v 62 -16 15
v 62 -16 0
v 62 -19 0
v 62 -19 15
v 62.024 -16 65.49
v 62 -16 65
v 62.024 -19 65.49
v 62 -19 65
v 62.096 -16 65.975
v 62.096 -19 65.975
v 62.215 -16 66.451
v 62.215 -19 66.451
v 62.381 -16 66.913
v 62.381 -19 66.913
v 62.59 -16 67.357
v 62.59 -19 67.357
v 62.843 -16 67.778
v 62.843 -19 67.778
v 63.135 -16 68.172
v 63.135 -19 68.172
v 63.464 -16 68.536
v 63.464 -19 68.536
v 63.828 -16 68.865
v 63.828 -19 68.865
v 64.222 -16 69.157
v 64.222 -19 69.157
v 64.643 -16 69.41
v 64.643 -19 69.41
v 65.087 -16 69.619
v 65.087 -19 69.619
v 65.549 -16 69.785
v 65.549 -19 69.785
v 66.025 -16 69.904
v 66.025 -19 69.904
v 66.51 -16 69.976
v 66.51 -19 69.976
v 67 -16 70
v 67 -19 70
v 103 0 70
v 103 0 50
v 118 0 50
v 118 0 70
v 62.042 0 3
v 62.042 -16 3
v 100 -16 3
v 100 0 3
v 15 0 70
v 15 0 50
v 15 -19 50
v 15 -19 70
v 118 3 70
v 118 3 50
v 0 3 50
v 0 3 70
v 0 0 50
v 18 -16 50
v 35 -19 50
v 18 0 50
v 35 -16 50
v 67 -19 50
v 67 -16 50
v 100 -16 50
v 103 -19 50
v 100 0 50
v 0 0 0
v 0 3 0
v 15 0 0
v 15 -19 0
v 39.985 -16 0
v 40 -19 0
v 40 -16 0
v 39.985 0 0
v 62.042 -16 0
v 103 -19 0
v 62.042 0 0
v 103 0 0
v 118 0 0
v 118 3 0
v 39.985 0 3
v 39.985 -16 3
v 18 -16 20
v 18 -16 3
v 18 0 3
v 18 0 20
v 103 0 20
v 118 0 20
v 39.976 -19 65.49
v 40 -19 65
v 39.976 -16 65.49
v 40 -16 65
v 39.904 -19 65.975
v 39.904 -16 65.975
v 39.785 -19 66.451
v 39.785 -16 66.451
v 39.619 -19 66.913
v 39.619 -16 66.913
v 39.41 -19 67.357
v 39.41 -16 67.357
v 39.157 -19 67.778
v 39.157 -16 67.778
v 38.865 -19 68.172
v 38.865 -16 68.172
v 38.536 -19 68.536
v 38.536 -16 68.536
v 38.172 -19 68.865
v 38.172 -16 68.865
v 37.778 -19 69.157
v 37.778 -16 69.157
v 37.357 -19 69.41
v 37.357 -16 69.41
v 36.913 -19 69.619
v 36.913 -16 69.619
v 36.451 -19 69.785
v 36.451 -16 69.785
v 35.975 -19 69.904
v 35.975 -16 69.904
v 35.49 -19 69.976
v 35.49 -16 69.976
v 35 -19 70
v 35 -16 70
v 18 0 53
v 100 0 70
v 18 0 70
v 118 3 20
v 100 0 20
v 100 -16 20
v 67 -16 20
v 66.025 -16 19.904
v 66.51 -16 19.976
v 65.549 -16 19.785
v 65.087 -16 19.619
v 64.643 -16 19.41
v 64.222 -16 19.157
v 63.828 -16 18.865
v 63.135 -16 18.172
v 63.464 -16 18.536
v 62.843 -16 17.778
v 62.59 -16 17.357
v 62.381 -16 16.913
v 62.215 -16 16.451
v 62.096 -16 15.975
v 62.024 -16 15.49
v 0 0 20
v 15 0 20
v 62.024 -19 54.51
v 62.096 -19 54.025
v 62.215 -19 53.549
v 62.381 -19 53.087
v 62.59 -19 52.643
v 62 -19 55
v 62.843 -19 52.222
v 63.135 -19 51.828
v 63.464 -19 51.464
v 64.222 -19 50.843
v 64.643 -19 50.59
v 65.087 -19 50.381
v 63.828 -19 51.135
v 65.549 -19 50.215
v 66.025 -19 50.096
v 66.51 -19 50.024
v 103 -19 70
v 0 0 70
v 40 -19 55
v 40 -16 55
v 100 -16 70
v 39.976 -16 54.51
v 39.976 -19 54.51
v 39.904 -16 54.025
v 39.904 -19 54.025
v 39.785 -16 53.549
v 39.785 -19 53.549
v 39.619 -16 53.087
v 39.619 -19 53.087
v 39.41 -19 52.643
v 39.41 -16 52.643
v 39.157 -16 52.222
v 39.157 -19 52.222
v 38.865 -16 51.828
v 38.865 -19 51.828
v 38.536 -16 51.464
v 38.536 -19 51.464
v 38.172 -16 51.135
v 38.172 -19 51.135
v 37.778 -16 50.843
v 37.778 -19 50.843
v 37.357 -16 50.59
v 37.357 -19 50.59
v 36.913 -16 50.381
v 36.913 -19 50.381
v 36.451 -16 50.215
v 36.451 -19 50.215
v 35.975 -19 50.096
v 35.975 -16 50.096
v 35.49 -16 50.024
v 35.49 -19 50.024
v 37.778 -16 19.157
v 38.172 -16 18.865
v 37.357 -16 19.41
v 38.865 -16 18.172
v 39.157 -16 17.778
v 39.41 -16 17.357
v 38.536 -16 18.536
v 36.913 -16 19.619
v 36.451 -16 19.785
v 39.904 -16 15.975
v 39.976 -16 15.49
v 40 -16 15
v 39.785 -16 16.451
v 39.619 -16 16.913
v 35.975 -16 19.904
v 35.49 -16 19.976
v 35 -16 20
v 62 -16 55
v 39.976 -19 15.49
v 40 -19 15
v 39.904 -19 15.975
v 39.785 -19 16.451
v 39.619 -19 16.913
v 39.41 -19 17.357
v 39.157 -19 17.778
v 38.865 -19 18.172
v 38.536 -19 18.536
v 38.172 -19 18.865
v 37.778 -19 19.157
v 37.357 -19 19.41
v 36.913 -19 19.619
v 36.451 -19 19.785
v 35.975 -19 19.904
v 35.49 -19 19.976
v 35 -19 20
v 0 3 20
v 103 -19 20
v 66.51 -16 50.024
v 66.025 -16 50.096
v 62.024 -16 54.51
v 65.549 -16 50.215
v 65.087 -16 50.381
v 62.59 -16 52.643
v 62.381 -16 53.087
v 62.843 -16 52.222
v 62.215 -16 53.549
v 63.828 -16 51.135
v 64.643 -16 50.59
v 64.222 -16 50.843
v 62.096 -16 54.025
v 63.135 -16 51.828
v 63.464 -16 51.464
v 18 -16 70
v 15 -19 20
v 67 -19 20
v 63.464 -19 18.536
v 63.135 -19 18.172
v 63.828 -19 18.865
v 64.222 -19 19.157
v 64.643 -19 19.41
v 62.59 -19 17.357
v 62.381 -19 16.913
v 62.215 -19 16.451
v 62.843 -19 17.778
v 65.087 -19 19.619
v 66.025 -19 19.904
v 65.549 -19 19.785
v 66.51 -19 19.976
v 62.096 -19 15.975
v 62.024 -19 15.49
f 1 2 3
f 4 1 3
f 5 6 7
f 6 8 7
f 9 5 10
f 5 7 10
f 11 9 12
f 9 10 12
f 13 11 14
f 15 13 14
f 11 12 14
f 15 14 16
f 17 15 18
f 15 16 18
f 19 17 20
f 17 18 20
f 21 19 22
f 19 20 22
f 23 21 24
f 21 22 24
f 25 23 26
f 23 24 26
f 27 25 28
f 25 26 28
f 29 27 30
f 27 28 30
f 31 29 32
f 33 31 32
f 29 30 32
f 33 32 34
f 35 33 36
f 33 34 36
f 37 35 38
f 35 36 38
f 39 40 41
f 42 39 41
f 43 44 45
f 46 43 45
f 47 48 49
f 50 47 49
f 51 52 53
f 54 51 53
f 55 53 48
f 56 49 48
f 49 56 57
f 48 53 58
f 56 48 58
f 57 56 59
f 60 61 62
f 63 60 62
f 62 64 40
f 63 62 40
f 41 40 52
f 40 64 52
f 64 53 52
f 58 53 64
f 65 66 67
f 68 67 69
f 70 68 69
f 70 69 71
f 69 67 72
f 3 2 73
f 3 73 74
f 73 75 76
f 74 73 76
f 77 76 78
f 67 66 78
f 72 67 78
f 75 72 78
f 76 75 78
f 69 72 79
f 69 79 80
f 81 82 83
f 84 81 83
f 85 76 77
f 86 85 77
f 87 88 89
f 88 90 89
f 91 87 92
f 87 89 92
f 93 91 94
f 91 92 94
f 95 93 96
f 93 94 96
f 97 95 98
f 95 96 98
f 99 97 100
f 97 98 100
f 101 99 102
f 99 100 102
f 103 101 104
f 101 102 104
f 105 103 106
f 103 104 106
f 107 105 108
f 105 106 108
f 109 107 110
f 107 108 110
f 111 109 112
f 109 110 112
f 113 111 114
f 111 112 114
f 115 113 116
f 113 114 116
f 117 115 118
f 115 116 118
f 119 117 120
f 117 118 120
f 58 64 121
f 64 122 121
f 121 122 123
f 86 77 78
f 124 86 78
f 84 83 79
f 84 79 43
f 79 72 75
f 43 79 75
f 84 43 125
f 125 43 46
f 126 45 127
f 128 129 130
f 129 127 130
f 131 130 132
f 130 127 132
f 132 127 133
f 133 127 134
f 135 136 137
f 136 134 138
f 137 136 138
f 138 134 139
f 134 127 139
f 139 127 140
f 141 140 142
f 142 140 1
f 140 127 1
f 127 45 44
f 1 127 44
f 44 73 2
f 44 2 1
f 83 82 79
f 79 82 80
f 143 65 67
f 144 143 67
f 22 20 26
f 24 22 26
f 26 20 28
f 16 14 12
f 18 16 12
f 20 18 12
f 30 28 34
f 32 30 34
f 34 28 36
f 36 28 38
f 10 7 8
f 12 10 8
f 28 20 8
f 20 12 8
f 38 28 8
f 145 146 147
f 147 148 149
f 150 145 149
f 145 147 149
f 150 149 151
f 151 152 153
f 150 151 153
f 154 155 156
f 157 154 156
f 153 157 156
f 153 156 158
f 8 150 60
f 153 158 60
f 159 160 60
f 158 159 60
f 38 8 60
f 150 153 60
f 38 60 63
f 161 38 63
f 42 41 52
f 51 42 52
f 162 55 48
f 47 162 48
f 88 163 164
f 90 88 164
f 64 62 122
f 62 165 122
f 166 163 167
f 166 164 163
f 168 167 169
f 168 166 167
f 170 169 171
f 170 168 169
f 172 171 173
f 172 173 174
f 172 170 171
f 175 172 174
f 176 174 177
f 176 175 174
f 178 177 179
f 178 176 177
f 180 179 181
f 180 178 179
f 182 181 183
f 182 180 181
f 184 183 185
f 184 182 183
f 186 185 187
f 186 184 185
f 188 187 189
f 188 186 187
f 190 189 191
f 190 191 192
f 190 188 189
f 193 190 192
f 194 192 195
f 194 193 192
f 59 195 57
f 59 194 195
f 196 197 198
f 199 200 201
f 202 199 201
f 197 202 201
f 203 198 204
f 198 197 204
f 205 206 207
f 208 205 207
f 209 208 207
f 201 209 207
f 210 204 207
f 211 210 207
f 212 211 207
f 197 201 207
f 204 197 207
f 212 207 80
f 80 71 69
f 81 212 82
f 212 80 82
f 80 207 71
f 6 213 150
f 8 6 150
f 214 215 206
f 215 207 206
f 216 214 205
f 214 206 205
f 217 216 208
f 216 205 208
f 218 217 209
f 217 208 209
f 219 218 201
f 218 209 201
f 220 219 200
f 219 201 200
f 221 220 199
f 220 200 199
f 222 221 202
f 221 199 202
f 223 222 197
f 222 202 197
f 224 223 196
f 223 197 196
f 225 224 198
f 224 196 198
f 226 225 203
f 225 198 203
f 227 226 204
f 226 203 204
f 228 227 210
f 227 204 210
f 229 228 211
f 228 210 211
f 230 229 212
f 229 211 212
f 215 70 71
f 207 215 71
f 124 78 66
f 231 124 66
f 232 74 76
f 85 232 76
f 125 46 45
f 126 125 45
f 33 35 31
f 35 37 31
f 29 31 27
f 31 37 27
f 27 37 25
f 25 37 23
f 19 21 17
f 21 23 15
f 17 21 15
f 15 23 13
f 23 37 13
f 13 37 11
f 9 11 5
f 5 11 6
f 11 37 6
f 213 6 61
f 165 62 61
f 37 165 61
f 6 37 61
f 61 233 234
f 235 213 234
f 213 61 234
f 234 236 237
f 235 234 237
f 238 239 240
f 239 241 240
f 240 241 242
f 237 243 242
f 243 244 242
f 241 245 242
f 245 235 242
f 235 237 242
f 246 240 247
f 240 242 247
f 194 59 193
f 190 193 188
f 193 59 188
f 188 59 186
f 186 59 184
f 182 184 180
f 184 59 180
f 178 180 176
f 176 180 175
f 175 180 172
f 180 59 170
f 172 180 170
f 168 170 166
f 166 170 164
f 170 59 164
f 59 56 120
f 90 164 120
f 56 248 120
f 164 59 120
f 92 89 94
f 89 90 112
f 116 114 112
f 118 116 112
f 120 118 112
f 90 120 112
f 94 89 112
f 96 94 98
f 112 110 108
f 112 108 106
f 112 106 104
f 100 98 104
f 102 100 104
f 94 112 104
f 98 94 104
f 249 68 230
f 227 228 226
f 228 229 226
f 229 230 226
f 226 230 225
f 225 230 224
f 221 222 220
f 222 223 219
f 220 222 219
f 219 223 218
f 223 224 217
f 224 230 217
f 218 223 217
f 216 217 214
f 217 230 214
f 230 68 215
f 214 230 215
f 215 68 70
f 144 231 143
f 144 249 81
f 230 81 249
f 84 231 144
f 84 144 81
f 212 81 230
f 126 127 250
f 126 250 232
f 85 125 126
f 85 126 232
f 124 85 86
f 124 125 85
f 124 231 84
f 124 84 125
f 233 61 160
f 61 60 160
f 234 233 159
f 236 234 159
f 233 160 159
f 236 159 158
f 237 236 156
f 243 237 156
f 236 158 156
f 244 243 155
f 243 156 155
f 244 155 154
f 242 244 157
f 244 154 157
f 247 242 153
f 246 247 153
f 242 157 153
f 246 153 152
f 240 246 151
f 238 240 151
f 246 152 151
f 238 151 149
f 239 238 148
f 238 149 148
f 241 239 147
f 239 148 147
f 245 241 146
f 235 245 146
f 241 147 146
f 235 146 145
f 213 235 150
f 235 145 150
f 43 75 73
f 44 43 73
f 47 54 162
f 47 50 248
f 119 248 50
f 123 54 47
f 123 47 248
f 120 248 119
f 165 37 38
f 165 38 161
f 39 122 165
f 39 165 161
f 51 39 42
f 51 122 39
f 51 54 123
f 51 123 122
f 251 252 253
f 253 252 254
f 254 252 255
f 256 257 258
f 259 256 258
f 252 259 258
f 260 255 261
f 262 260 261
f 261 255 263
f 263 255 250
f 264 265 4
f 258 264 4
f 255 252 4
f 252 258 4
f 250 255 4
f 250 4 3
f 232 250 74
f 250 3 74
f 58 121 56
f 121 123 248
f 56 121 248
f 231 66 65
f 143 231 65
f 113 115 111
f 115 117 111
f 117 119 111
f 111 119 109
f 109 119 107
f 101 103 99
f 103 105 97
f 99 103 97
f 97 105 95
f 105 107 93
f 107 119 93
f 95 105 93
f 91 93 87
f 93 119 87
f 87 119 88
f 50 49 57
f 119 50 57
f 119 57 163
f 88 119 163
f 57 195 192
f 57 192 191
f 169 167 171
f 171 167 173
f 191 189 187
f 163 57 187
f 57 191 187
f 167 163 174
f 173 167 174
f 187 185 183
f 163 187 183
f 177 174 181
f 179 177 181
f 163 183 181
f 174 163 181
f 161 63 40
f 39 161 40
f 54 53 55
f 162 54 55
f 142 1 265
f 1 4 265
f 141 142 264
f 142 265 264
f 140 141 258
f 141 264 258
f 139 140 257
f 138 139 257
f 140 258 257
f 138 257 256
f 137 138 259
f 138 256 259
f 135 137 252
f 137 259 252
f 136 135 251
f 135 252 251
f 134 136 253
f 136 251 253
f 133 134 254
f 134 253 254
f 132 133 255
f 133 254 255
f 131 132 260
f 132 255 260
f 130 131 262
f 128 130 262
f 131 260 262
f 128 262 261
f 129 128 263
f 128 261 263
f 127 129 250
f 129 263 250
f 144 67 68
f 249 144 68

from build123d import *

# Parameters (mm, degrees)
F1_DEPTH  = 20
F3_W      = 22.0410469919
F3_H      = 16.0494968295
F3_W_2    = 38.4351052344
F3_H_2    = 17.3500169185
F4_DEPTH  = 3
F5_R      = 5
F9_DEPTH  = 25
F10_DEPTH = 3
F11_R     = 5


with BuildPart() as f1:
    # F0 (on Top) → F1 (new body)
    with BuildSketch(Plane.XY):
        Polygon((0, 3), (0, 0), (15, 0), (18, 0), (100, 0), (103, 0), (118, 0), (118, 3), align=None)
        Polygon((18, 0), (15, 0), (15, -19), (40, -19), (40, -16), (18, -16), align=None)
        Polygon((103, 0), (100, 0), (100, -16), (62, -16), (62, -19), (103, -19), align=None)
    extrude(amount=F1_DEPTH)

    # F3 (on offset) → F4 (join)
    with BuildSketch(Plane(origin=(0, 0, 0), x_dir=(1, 0, 0), z_dir=(0, 0, -1))):
        with Locations((28.9649507031, 8.0247484148)):
            Rectangle(F3_W, F3_H)
        with Locations((81.2598299235, 7.7891485707)):
            Rectangle(F3_W_2, F3_H_2)
    extrude(amount=-F4_DEPTH)

    # F5
    f5_edges = [f1.edges().sort_by_distance(p)[0] for p in [
        (40, -17.5, 20),
        (62, -17.5, 20),
    ]]
    fillet(f5_edges, radius=F5_R)


with BuildPart() as f6_1:
    # F6: copy of F1
    add(f1.part.moved(Location((0, 0, 50))))


with BuildPart() as f8_1:
    # F8: copy of F1
    add(f1.part.moved(Location((0, 0, 50))))

    # F9 (cut): a face of the model
    f9_faces = [f8_1.faces().sort_by_distance(p)[0] for p in [
        (28.9927370995, -8, 53),
    ]]
    extrude(f9_faces, amount=-F9_DEPTH, mode=Mode.SUBTRACT)

    # F10 (cut): a face of the model
    f10_faces = [f8_1.faces().sort_by_distance(p)[0] for p in [
        (81.0211386532, -8, 53),
    ]]
    extrude(f10_faces, amount=-F10_DEPTH, mode=Mode.SUBTRACT)

    # F11
    f11_edges = [f8_1.edges().sort_by_distance(p)[0] for p in [
        (40, -17.5, 50),
        (62, -17.5, 50),
    ]]
    fillet(f11_edges, radius=F11_R)


solid = Compound([f1.part, f8_1.part])
